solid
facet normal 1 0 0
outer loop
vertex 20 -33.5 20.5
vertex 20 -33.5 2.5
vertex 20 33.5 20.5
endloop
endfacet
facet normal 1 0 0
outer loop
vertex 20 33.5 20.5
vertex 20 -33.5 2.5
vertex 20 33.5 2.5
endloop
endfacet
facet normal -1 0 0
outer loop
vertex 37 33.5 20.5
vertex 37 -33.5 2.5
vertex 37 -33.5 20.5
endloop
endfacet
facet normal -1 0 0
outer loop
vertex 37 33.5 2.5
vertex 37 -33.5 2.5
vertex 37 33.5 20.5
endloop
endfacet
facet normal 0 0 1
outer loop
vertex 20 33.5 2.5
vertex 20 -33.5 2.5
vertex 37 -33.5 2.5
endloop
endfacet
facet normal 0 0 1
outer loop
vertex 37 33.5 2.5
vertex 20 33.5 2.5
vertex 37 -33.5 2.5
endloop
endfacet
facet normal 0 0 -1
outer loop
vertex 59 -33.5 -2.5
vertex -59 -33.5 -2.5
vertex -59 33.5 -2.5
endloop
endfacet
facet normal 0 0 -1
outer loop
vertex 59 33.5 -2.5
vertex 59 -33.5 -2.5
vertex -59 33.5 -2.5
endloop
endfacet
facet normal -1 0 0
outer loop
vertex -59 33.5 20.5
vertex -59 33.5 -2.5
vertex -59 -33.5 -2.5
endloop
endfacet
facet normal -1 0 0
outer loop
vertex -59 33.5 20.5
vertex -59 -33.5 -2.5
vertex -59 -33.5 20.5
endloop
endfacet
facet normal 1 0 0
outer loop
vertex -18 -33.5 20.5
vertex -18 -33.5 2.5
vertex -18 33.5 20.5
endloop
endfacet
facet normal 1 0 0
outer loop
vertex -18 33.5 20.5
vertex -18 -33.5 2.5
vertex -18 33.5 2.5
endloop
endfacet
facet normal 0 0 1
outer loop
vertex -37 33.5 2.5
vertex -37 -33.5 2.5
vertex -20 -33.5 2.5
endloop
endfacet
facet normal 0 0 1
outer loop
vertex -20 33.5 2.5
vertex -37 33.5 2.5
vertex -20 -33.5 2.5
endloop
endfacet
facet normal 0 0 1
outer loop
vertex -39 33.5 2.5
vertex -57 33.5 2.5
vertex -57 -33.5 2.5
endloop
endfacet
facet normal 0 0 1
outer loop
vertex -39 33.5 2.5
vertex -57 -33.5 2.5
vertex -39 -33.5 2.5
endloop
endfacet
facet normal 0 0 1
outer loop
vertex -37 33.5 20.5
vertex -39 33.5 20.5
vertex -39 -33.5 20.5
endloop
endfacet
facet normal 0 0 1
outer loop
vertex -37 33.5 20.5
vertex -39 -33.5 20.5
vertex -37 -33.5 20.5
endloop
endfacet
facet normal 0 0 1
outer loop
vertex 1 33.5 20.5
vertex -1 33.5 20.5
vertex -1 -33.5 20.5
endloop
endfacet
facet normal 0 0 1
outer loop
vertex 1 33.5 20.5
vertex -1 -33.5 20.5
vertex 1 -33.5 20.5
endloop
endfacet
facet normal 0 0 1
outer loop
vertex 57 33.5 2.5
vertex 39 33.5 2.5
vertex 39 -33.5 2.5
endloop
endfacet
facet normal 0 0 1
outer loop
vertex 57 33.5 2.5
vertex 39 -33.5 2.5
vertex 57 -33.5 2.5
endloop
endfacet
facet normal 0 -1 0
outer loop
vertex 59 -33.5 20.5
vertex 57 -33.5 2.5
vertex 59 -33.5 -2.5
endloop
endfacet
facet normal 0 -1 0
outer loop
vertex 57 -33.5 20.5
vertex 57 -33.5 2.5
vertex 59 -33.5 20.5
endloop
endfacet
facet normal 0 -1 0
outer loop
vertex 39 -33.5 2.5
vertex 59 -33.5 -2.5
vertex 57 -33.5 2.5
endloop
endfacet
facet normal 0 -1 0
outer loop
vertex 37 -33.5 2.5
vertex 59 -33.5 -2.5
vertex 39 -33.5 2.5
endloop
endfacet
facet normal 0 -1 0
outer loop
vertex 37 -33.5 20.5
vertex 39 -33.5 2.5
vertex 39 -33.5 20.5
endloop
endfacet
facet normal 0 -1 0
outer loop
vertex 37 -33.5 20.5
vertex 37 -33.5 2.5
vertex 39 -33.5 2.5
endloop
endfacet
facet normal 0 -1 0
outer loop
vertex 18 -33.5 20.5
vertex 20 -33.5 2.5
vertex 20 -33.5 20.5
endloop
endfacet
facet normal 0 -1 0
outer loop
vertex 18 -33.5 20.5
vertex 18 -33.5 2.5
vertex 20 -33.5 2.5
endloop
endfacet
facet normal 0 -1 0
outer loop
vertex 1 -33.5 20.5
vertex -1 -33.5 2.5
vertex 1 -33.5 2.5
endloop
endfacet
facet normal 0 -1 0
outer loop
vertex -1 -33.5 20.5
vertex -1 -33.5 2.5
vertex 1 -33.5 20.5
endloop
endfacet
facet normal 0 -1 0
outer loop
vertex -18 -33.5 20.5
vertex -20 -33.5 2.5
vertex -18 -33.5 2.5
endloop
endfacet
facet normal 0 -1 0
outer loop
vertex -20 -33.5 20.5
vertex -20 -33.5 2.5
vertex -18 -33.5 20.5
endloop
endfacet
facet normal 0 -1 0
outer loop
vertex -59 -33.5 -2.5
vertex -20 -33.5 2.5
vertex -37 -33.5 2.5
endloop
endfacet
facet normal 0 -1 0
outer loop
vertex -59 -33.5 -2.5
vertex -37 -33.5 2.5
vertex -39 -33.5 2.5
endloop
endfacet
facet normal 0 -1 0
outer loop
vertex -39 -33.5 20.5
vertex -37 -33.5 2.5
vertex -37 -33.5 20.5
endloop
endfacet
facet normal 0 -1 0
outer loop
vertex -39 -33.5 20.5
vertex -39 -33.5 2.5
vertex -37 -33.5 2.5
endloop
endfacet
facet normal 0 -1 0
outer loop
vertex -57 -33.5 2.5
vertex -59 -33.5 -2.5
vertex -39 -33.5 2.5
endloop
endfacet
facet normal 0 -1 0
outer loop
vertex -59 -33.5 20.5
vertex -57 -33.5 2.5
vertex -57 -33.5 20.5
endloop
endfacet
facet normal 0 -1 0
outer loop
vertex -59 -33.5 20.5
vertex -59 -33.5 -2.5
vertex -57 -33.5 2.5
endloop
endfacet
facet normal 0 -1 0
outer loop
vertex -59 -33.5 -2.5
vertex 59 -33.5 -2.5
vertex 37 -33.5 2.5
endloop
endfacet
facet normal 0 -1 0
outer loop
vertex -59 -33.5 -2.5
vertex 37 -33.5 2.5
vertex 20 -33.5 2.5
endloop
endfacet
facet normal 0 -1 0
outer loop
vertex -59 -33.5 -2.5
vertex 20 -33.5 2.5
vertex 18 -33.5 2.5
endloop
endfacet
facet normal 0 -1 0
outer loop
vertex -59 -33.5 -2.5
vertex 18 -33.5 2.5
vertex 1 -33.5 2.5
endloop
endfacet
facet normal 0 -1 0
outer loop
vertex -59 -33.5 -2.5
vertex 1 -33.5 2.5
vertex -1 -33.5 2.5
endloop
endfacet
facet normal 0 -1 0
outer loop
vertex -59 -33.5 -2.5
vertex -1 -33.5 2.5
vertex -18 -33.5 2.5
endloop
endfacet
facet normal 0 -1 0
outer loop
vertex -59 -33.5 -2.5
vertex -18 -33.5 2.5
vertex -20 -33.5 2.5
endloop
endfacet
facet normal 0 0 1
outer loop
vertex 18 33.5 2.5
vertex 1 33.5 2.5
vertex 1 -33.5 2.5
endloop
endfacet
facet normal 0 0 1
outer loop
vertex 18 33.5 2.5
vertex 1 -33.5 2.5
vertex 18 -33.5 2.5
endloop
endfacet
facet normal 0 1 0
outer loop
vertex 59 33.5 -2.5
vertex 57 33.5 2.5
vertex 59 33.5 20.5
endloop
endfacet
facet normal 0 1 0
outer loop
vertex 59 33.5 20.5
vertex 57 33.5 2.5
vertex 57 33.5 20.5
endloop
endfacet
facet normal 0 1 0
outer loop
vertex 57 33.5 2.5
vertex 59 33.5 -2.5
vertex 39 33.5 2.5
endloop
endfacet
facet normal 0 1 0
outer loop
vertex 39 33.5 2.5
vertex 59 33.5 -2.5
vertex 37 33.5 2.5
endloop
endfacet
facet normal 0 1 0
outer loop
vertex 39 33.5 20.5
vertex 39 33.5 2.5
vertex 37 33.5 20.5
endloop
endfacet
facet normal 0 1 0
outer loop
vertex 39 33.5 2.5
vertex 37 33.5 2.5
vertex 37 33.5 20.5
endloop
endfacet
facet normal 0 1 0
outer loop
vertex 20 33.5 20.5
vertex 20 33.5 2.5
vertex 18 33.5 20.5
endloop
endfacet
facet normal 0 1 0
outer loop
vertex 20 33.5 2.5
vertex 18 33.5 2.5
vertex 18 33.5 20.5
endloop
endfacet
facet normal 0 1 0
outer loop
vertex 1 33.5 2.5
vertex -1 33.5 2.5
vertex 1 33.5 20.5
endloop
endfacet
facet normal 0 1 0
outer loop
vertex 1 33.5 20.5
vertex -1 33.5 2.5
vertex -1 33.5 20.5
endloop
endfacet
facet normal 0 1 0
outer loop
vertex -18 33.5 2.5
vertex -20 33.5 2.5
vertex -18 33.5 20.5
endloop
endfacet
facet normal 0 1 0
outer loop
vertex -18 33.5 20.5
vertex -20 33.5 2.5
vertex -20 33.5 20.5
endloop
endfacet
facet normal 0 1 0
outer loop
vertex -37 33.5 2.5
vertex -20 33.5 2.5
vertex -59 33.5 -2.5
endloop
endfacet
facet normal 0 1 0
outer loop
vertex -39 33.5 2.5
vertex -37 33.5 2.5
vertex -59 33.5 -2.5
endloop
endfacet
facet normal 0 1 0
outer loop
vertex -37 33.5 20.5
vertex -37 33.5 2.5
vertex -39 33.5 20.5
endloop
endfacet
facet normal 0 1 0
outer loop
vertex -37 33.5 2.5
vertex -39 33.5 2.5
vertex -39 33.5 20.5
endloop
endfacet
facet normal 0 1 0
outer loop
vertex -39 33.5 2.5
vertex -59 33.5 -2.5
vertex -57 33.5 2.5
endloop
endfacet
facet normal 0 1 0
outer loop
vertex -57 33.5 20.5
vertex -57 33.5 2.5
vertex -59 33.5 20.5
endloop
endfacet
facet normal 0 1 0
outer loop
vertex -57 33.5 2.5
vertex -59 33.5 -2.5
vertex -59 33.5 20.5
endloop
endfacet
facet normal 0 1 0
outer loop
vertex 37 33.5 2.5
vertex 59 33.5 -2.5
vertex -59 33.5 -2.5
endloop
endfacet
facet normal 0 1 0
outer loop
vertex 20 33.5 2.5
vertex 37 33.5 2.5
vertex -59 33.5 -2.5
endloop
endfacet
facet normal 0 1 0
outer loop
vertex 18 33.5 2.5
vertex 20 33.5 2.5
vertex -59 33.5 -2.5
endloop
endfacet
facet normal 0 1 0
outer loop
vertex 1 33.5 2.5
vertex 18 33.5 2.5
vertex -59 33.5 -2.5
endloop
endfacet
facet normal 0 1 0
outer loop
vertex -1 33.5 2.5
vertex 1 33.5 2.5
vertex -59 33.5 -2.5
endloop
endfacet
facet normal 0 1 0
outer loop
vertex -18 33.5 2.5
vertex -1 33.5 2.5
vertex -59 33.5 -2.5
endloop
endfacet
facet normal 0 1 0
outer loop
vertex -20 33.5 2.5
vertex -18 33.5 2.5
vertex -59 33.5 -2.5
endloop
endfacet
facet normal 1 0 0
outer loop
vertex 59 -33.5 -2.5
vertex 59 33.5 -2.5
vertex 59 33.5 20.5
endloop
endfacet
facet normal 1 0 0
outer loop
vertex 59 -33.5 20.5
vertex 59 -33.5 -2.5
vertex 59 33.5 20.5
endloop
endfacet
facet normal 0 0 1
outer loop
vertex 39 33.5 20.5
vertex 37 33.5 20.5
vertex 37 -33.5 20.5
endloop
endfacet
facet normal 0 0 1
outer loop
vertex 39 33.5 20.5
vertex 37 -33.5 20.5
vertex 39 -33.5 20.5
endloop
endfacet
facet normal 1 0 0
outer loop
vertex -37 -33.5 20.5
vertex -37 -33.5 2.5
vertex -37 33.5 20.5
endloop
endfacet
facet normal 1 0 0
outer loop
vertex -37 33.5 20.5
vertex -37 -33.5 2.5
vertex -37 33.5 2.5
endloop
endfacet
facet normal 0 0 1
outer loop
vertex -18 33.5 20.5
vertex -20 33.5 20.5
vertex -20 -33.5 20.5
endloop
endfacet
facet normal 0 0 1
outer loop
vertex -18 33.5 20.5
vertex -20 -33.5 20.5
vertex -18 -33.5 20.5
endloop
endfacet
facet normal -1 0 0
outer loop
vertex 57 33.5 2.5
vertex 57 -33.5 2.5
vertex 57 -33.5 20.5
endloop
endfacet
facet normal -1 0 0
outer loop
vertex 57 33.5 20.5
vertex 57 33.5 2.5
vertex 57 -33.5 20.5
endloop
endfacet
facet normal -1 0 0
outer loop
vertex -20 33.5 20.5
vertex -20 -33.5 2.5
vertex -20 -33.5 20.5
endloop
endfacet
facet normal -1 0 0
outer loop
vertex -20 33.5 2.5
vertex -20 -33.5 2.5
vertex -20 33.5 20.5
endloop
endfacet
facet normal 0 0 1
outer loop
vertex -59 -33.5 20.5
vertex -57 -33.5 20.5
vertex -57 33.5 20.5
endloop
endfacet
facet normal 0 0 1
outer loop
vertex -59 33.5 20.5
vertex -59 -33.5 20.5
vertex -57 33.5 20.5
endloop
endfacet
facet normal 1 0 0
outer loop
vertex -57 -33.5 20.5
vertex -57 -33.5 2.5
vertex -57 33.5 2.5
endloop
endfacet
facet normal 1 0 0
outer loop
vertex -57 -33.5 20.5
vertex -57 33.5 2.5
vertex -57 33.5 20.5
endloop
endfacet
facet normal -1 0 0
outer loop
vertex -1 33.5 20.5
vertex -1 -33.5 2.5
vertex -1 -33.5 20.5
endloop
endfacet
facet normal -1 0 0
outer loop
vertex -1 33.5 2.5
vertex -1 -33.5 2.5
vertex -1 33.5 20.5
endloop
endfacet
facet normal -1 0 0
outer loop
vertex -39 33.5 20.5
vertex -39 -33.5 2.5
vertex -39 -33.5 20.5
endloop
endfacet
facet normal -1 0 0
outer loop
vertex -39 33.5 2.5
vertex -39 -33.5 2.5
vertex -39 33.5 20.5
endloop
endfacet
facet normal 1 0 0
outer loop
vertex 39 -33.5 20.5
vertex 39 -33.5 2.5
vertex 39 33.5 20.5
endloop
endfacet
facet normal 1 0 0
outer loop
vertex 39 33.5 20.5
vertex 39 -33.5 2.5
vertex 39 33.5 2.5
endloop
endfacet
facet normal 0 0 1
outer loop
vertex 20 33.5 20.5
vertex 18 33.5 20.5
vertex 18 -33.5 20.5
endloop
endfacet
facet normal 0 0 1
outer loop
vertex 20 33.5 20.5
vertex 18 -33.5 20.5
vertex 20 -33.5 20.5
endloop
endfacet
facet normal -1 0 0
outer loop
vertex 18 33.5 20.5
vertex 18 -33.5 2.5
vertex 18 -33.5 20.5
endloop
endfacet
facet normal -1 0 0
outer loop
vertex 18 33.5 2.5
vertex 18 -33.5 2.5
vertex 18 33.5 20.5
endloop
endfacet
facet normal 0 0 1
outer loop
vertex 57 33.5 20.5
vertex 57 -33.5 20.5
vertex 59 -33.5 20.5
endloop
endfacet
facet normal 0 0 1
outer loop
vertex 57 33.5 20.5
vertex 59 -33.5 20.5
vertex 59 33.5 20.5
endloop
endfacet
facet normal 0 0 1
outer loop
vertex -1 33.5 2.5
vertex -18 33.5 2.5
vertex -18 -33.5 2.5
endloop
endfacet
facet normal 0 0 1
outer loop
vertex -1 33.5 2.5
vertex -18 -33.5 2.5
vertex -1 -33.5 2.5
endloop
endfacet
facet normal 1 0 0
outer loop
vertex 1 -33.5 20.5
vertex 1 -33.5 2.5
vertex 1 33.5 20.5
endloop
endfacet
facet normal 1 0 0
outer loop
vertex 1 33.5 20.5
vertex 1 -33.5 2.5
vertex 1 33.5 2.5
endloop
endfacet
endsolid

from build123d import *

# Parameters (mm, degrees)
SKETCH1_W           = 114
SKETCH1_H           = 67
BOSS_EXTRUDE1_DEPTH = 2.5
SKETCH2_W           = 2
SKETCH2_H           = 67
BOSS_EXTRUDE2_DEPTH = 18
LPATTERN1_COUNT     = 5
LPATTERN1_PITCH     = 19
SKETCH3_W           = 23
SKETCH3_H           = 67
BOSS_EXTRUDE3_DEPTH = 2


with BuildPart() as part:
    # Sketch1 → Boss-Extrude1 (new body, symmetric)
    with BuildSketch(Plane.XY):
        Rectangle(SKETCH1_W, SKETCH1_H)
    extrude(amount=BOSS_EXTRUDE1_DEPTH, both=True)

    # Sketch2 → Boss-Extrude2 (add)
    with BuildSketch(Plane.XY.offset(2.5)):
        with Locations((-38, 0)):
            Rectangle(SKETCH2_W, SKETCH2_H)
    boss_extrude2 = extrude(amount=BOSS_EXTRUDE2_DEPTH)

    # LPattern1: Boss-Extrude2 ×5
    with Locations(*[(i * LPATTERN1_PITCH, 0, 0) for i in range(1, LPATTERN1_COUNT)]):
        add(boss_extrude2)

    # Sketch3 → Boss-Extrude3 (add)
    with BuildSketch(Plane.ZY.offset(57)):
        with Locations((9, 0)):
            Rectangle(SKETCH3_W, SKETCH3_H)
    boss_extrude3 = extrude(amount=BOSS_EXTRUDE3_DEPTH)

    # Mirror1: Boss-Extrude3 across plane
    add(boss_extrude3.mirror(Plane(origin=(0, 0, 0), x_dir=(0, 0, 1), z_dir=(1, 0, 0))))


solid = part.part
